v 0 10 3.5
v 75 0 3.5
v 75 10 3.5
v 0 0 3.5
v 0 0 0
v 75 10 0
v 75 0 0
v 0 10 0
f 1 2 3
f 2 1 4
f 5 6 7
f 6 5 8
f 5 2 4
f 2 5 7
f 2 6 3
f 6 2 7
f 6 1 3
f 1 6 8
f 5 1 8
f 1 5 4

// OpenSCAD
module supportPole(height)
{
	rotate([-90])
	difference()
	{
		cylinder(h=height, r=5);
		
		translate([-5.1, 0, -0.1])
			cube([11, 6, 166]);
	}
}

module plank(tolerance=0)
{
	difference()
	{
		cube([75, 10+tolerance, 3.5]);
	}
}

module bridgeSupport()
{
	length = 150;
	height = 20;
	thickness = 2;

	difference()
	{
		translate([0, 5])
		union()
		{
			cube([height, length, thickness]);
		
			for(i = [0: length: length])
			{
				translate([115, i, 0])
				rotate([0, 0, 90])
					supportPole(165);
			}
		}
		
		for(i = [0: length/11: length])
		{
			translate([-1.5, i, 3])
			rotate([0, 90, 0])
				#plank(0.2);
		}
	}
}

//supportPole(165);
//bridgeSupport();
plank();
